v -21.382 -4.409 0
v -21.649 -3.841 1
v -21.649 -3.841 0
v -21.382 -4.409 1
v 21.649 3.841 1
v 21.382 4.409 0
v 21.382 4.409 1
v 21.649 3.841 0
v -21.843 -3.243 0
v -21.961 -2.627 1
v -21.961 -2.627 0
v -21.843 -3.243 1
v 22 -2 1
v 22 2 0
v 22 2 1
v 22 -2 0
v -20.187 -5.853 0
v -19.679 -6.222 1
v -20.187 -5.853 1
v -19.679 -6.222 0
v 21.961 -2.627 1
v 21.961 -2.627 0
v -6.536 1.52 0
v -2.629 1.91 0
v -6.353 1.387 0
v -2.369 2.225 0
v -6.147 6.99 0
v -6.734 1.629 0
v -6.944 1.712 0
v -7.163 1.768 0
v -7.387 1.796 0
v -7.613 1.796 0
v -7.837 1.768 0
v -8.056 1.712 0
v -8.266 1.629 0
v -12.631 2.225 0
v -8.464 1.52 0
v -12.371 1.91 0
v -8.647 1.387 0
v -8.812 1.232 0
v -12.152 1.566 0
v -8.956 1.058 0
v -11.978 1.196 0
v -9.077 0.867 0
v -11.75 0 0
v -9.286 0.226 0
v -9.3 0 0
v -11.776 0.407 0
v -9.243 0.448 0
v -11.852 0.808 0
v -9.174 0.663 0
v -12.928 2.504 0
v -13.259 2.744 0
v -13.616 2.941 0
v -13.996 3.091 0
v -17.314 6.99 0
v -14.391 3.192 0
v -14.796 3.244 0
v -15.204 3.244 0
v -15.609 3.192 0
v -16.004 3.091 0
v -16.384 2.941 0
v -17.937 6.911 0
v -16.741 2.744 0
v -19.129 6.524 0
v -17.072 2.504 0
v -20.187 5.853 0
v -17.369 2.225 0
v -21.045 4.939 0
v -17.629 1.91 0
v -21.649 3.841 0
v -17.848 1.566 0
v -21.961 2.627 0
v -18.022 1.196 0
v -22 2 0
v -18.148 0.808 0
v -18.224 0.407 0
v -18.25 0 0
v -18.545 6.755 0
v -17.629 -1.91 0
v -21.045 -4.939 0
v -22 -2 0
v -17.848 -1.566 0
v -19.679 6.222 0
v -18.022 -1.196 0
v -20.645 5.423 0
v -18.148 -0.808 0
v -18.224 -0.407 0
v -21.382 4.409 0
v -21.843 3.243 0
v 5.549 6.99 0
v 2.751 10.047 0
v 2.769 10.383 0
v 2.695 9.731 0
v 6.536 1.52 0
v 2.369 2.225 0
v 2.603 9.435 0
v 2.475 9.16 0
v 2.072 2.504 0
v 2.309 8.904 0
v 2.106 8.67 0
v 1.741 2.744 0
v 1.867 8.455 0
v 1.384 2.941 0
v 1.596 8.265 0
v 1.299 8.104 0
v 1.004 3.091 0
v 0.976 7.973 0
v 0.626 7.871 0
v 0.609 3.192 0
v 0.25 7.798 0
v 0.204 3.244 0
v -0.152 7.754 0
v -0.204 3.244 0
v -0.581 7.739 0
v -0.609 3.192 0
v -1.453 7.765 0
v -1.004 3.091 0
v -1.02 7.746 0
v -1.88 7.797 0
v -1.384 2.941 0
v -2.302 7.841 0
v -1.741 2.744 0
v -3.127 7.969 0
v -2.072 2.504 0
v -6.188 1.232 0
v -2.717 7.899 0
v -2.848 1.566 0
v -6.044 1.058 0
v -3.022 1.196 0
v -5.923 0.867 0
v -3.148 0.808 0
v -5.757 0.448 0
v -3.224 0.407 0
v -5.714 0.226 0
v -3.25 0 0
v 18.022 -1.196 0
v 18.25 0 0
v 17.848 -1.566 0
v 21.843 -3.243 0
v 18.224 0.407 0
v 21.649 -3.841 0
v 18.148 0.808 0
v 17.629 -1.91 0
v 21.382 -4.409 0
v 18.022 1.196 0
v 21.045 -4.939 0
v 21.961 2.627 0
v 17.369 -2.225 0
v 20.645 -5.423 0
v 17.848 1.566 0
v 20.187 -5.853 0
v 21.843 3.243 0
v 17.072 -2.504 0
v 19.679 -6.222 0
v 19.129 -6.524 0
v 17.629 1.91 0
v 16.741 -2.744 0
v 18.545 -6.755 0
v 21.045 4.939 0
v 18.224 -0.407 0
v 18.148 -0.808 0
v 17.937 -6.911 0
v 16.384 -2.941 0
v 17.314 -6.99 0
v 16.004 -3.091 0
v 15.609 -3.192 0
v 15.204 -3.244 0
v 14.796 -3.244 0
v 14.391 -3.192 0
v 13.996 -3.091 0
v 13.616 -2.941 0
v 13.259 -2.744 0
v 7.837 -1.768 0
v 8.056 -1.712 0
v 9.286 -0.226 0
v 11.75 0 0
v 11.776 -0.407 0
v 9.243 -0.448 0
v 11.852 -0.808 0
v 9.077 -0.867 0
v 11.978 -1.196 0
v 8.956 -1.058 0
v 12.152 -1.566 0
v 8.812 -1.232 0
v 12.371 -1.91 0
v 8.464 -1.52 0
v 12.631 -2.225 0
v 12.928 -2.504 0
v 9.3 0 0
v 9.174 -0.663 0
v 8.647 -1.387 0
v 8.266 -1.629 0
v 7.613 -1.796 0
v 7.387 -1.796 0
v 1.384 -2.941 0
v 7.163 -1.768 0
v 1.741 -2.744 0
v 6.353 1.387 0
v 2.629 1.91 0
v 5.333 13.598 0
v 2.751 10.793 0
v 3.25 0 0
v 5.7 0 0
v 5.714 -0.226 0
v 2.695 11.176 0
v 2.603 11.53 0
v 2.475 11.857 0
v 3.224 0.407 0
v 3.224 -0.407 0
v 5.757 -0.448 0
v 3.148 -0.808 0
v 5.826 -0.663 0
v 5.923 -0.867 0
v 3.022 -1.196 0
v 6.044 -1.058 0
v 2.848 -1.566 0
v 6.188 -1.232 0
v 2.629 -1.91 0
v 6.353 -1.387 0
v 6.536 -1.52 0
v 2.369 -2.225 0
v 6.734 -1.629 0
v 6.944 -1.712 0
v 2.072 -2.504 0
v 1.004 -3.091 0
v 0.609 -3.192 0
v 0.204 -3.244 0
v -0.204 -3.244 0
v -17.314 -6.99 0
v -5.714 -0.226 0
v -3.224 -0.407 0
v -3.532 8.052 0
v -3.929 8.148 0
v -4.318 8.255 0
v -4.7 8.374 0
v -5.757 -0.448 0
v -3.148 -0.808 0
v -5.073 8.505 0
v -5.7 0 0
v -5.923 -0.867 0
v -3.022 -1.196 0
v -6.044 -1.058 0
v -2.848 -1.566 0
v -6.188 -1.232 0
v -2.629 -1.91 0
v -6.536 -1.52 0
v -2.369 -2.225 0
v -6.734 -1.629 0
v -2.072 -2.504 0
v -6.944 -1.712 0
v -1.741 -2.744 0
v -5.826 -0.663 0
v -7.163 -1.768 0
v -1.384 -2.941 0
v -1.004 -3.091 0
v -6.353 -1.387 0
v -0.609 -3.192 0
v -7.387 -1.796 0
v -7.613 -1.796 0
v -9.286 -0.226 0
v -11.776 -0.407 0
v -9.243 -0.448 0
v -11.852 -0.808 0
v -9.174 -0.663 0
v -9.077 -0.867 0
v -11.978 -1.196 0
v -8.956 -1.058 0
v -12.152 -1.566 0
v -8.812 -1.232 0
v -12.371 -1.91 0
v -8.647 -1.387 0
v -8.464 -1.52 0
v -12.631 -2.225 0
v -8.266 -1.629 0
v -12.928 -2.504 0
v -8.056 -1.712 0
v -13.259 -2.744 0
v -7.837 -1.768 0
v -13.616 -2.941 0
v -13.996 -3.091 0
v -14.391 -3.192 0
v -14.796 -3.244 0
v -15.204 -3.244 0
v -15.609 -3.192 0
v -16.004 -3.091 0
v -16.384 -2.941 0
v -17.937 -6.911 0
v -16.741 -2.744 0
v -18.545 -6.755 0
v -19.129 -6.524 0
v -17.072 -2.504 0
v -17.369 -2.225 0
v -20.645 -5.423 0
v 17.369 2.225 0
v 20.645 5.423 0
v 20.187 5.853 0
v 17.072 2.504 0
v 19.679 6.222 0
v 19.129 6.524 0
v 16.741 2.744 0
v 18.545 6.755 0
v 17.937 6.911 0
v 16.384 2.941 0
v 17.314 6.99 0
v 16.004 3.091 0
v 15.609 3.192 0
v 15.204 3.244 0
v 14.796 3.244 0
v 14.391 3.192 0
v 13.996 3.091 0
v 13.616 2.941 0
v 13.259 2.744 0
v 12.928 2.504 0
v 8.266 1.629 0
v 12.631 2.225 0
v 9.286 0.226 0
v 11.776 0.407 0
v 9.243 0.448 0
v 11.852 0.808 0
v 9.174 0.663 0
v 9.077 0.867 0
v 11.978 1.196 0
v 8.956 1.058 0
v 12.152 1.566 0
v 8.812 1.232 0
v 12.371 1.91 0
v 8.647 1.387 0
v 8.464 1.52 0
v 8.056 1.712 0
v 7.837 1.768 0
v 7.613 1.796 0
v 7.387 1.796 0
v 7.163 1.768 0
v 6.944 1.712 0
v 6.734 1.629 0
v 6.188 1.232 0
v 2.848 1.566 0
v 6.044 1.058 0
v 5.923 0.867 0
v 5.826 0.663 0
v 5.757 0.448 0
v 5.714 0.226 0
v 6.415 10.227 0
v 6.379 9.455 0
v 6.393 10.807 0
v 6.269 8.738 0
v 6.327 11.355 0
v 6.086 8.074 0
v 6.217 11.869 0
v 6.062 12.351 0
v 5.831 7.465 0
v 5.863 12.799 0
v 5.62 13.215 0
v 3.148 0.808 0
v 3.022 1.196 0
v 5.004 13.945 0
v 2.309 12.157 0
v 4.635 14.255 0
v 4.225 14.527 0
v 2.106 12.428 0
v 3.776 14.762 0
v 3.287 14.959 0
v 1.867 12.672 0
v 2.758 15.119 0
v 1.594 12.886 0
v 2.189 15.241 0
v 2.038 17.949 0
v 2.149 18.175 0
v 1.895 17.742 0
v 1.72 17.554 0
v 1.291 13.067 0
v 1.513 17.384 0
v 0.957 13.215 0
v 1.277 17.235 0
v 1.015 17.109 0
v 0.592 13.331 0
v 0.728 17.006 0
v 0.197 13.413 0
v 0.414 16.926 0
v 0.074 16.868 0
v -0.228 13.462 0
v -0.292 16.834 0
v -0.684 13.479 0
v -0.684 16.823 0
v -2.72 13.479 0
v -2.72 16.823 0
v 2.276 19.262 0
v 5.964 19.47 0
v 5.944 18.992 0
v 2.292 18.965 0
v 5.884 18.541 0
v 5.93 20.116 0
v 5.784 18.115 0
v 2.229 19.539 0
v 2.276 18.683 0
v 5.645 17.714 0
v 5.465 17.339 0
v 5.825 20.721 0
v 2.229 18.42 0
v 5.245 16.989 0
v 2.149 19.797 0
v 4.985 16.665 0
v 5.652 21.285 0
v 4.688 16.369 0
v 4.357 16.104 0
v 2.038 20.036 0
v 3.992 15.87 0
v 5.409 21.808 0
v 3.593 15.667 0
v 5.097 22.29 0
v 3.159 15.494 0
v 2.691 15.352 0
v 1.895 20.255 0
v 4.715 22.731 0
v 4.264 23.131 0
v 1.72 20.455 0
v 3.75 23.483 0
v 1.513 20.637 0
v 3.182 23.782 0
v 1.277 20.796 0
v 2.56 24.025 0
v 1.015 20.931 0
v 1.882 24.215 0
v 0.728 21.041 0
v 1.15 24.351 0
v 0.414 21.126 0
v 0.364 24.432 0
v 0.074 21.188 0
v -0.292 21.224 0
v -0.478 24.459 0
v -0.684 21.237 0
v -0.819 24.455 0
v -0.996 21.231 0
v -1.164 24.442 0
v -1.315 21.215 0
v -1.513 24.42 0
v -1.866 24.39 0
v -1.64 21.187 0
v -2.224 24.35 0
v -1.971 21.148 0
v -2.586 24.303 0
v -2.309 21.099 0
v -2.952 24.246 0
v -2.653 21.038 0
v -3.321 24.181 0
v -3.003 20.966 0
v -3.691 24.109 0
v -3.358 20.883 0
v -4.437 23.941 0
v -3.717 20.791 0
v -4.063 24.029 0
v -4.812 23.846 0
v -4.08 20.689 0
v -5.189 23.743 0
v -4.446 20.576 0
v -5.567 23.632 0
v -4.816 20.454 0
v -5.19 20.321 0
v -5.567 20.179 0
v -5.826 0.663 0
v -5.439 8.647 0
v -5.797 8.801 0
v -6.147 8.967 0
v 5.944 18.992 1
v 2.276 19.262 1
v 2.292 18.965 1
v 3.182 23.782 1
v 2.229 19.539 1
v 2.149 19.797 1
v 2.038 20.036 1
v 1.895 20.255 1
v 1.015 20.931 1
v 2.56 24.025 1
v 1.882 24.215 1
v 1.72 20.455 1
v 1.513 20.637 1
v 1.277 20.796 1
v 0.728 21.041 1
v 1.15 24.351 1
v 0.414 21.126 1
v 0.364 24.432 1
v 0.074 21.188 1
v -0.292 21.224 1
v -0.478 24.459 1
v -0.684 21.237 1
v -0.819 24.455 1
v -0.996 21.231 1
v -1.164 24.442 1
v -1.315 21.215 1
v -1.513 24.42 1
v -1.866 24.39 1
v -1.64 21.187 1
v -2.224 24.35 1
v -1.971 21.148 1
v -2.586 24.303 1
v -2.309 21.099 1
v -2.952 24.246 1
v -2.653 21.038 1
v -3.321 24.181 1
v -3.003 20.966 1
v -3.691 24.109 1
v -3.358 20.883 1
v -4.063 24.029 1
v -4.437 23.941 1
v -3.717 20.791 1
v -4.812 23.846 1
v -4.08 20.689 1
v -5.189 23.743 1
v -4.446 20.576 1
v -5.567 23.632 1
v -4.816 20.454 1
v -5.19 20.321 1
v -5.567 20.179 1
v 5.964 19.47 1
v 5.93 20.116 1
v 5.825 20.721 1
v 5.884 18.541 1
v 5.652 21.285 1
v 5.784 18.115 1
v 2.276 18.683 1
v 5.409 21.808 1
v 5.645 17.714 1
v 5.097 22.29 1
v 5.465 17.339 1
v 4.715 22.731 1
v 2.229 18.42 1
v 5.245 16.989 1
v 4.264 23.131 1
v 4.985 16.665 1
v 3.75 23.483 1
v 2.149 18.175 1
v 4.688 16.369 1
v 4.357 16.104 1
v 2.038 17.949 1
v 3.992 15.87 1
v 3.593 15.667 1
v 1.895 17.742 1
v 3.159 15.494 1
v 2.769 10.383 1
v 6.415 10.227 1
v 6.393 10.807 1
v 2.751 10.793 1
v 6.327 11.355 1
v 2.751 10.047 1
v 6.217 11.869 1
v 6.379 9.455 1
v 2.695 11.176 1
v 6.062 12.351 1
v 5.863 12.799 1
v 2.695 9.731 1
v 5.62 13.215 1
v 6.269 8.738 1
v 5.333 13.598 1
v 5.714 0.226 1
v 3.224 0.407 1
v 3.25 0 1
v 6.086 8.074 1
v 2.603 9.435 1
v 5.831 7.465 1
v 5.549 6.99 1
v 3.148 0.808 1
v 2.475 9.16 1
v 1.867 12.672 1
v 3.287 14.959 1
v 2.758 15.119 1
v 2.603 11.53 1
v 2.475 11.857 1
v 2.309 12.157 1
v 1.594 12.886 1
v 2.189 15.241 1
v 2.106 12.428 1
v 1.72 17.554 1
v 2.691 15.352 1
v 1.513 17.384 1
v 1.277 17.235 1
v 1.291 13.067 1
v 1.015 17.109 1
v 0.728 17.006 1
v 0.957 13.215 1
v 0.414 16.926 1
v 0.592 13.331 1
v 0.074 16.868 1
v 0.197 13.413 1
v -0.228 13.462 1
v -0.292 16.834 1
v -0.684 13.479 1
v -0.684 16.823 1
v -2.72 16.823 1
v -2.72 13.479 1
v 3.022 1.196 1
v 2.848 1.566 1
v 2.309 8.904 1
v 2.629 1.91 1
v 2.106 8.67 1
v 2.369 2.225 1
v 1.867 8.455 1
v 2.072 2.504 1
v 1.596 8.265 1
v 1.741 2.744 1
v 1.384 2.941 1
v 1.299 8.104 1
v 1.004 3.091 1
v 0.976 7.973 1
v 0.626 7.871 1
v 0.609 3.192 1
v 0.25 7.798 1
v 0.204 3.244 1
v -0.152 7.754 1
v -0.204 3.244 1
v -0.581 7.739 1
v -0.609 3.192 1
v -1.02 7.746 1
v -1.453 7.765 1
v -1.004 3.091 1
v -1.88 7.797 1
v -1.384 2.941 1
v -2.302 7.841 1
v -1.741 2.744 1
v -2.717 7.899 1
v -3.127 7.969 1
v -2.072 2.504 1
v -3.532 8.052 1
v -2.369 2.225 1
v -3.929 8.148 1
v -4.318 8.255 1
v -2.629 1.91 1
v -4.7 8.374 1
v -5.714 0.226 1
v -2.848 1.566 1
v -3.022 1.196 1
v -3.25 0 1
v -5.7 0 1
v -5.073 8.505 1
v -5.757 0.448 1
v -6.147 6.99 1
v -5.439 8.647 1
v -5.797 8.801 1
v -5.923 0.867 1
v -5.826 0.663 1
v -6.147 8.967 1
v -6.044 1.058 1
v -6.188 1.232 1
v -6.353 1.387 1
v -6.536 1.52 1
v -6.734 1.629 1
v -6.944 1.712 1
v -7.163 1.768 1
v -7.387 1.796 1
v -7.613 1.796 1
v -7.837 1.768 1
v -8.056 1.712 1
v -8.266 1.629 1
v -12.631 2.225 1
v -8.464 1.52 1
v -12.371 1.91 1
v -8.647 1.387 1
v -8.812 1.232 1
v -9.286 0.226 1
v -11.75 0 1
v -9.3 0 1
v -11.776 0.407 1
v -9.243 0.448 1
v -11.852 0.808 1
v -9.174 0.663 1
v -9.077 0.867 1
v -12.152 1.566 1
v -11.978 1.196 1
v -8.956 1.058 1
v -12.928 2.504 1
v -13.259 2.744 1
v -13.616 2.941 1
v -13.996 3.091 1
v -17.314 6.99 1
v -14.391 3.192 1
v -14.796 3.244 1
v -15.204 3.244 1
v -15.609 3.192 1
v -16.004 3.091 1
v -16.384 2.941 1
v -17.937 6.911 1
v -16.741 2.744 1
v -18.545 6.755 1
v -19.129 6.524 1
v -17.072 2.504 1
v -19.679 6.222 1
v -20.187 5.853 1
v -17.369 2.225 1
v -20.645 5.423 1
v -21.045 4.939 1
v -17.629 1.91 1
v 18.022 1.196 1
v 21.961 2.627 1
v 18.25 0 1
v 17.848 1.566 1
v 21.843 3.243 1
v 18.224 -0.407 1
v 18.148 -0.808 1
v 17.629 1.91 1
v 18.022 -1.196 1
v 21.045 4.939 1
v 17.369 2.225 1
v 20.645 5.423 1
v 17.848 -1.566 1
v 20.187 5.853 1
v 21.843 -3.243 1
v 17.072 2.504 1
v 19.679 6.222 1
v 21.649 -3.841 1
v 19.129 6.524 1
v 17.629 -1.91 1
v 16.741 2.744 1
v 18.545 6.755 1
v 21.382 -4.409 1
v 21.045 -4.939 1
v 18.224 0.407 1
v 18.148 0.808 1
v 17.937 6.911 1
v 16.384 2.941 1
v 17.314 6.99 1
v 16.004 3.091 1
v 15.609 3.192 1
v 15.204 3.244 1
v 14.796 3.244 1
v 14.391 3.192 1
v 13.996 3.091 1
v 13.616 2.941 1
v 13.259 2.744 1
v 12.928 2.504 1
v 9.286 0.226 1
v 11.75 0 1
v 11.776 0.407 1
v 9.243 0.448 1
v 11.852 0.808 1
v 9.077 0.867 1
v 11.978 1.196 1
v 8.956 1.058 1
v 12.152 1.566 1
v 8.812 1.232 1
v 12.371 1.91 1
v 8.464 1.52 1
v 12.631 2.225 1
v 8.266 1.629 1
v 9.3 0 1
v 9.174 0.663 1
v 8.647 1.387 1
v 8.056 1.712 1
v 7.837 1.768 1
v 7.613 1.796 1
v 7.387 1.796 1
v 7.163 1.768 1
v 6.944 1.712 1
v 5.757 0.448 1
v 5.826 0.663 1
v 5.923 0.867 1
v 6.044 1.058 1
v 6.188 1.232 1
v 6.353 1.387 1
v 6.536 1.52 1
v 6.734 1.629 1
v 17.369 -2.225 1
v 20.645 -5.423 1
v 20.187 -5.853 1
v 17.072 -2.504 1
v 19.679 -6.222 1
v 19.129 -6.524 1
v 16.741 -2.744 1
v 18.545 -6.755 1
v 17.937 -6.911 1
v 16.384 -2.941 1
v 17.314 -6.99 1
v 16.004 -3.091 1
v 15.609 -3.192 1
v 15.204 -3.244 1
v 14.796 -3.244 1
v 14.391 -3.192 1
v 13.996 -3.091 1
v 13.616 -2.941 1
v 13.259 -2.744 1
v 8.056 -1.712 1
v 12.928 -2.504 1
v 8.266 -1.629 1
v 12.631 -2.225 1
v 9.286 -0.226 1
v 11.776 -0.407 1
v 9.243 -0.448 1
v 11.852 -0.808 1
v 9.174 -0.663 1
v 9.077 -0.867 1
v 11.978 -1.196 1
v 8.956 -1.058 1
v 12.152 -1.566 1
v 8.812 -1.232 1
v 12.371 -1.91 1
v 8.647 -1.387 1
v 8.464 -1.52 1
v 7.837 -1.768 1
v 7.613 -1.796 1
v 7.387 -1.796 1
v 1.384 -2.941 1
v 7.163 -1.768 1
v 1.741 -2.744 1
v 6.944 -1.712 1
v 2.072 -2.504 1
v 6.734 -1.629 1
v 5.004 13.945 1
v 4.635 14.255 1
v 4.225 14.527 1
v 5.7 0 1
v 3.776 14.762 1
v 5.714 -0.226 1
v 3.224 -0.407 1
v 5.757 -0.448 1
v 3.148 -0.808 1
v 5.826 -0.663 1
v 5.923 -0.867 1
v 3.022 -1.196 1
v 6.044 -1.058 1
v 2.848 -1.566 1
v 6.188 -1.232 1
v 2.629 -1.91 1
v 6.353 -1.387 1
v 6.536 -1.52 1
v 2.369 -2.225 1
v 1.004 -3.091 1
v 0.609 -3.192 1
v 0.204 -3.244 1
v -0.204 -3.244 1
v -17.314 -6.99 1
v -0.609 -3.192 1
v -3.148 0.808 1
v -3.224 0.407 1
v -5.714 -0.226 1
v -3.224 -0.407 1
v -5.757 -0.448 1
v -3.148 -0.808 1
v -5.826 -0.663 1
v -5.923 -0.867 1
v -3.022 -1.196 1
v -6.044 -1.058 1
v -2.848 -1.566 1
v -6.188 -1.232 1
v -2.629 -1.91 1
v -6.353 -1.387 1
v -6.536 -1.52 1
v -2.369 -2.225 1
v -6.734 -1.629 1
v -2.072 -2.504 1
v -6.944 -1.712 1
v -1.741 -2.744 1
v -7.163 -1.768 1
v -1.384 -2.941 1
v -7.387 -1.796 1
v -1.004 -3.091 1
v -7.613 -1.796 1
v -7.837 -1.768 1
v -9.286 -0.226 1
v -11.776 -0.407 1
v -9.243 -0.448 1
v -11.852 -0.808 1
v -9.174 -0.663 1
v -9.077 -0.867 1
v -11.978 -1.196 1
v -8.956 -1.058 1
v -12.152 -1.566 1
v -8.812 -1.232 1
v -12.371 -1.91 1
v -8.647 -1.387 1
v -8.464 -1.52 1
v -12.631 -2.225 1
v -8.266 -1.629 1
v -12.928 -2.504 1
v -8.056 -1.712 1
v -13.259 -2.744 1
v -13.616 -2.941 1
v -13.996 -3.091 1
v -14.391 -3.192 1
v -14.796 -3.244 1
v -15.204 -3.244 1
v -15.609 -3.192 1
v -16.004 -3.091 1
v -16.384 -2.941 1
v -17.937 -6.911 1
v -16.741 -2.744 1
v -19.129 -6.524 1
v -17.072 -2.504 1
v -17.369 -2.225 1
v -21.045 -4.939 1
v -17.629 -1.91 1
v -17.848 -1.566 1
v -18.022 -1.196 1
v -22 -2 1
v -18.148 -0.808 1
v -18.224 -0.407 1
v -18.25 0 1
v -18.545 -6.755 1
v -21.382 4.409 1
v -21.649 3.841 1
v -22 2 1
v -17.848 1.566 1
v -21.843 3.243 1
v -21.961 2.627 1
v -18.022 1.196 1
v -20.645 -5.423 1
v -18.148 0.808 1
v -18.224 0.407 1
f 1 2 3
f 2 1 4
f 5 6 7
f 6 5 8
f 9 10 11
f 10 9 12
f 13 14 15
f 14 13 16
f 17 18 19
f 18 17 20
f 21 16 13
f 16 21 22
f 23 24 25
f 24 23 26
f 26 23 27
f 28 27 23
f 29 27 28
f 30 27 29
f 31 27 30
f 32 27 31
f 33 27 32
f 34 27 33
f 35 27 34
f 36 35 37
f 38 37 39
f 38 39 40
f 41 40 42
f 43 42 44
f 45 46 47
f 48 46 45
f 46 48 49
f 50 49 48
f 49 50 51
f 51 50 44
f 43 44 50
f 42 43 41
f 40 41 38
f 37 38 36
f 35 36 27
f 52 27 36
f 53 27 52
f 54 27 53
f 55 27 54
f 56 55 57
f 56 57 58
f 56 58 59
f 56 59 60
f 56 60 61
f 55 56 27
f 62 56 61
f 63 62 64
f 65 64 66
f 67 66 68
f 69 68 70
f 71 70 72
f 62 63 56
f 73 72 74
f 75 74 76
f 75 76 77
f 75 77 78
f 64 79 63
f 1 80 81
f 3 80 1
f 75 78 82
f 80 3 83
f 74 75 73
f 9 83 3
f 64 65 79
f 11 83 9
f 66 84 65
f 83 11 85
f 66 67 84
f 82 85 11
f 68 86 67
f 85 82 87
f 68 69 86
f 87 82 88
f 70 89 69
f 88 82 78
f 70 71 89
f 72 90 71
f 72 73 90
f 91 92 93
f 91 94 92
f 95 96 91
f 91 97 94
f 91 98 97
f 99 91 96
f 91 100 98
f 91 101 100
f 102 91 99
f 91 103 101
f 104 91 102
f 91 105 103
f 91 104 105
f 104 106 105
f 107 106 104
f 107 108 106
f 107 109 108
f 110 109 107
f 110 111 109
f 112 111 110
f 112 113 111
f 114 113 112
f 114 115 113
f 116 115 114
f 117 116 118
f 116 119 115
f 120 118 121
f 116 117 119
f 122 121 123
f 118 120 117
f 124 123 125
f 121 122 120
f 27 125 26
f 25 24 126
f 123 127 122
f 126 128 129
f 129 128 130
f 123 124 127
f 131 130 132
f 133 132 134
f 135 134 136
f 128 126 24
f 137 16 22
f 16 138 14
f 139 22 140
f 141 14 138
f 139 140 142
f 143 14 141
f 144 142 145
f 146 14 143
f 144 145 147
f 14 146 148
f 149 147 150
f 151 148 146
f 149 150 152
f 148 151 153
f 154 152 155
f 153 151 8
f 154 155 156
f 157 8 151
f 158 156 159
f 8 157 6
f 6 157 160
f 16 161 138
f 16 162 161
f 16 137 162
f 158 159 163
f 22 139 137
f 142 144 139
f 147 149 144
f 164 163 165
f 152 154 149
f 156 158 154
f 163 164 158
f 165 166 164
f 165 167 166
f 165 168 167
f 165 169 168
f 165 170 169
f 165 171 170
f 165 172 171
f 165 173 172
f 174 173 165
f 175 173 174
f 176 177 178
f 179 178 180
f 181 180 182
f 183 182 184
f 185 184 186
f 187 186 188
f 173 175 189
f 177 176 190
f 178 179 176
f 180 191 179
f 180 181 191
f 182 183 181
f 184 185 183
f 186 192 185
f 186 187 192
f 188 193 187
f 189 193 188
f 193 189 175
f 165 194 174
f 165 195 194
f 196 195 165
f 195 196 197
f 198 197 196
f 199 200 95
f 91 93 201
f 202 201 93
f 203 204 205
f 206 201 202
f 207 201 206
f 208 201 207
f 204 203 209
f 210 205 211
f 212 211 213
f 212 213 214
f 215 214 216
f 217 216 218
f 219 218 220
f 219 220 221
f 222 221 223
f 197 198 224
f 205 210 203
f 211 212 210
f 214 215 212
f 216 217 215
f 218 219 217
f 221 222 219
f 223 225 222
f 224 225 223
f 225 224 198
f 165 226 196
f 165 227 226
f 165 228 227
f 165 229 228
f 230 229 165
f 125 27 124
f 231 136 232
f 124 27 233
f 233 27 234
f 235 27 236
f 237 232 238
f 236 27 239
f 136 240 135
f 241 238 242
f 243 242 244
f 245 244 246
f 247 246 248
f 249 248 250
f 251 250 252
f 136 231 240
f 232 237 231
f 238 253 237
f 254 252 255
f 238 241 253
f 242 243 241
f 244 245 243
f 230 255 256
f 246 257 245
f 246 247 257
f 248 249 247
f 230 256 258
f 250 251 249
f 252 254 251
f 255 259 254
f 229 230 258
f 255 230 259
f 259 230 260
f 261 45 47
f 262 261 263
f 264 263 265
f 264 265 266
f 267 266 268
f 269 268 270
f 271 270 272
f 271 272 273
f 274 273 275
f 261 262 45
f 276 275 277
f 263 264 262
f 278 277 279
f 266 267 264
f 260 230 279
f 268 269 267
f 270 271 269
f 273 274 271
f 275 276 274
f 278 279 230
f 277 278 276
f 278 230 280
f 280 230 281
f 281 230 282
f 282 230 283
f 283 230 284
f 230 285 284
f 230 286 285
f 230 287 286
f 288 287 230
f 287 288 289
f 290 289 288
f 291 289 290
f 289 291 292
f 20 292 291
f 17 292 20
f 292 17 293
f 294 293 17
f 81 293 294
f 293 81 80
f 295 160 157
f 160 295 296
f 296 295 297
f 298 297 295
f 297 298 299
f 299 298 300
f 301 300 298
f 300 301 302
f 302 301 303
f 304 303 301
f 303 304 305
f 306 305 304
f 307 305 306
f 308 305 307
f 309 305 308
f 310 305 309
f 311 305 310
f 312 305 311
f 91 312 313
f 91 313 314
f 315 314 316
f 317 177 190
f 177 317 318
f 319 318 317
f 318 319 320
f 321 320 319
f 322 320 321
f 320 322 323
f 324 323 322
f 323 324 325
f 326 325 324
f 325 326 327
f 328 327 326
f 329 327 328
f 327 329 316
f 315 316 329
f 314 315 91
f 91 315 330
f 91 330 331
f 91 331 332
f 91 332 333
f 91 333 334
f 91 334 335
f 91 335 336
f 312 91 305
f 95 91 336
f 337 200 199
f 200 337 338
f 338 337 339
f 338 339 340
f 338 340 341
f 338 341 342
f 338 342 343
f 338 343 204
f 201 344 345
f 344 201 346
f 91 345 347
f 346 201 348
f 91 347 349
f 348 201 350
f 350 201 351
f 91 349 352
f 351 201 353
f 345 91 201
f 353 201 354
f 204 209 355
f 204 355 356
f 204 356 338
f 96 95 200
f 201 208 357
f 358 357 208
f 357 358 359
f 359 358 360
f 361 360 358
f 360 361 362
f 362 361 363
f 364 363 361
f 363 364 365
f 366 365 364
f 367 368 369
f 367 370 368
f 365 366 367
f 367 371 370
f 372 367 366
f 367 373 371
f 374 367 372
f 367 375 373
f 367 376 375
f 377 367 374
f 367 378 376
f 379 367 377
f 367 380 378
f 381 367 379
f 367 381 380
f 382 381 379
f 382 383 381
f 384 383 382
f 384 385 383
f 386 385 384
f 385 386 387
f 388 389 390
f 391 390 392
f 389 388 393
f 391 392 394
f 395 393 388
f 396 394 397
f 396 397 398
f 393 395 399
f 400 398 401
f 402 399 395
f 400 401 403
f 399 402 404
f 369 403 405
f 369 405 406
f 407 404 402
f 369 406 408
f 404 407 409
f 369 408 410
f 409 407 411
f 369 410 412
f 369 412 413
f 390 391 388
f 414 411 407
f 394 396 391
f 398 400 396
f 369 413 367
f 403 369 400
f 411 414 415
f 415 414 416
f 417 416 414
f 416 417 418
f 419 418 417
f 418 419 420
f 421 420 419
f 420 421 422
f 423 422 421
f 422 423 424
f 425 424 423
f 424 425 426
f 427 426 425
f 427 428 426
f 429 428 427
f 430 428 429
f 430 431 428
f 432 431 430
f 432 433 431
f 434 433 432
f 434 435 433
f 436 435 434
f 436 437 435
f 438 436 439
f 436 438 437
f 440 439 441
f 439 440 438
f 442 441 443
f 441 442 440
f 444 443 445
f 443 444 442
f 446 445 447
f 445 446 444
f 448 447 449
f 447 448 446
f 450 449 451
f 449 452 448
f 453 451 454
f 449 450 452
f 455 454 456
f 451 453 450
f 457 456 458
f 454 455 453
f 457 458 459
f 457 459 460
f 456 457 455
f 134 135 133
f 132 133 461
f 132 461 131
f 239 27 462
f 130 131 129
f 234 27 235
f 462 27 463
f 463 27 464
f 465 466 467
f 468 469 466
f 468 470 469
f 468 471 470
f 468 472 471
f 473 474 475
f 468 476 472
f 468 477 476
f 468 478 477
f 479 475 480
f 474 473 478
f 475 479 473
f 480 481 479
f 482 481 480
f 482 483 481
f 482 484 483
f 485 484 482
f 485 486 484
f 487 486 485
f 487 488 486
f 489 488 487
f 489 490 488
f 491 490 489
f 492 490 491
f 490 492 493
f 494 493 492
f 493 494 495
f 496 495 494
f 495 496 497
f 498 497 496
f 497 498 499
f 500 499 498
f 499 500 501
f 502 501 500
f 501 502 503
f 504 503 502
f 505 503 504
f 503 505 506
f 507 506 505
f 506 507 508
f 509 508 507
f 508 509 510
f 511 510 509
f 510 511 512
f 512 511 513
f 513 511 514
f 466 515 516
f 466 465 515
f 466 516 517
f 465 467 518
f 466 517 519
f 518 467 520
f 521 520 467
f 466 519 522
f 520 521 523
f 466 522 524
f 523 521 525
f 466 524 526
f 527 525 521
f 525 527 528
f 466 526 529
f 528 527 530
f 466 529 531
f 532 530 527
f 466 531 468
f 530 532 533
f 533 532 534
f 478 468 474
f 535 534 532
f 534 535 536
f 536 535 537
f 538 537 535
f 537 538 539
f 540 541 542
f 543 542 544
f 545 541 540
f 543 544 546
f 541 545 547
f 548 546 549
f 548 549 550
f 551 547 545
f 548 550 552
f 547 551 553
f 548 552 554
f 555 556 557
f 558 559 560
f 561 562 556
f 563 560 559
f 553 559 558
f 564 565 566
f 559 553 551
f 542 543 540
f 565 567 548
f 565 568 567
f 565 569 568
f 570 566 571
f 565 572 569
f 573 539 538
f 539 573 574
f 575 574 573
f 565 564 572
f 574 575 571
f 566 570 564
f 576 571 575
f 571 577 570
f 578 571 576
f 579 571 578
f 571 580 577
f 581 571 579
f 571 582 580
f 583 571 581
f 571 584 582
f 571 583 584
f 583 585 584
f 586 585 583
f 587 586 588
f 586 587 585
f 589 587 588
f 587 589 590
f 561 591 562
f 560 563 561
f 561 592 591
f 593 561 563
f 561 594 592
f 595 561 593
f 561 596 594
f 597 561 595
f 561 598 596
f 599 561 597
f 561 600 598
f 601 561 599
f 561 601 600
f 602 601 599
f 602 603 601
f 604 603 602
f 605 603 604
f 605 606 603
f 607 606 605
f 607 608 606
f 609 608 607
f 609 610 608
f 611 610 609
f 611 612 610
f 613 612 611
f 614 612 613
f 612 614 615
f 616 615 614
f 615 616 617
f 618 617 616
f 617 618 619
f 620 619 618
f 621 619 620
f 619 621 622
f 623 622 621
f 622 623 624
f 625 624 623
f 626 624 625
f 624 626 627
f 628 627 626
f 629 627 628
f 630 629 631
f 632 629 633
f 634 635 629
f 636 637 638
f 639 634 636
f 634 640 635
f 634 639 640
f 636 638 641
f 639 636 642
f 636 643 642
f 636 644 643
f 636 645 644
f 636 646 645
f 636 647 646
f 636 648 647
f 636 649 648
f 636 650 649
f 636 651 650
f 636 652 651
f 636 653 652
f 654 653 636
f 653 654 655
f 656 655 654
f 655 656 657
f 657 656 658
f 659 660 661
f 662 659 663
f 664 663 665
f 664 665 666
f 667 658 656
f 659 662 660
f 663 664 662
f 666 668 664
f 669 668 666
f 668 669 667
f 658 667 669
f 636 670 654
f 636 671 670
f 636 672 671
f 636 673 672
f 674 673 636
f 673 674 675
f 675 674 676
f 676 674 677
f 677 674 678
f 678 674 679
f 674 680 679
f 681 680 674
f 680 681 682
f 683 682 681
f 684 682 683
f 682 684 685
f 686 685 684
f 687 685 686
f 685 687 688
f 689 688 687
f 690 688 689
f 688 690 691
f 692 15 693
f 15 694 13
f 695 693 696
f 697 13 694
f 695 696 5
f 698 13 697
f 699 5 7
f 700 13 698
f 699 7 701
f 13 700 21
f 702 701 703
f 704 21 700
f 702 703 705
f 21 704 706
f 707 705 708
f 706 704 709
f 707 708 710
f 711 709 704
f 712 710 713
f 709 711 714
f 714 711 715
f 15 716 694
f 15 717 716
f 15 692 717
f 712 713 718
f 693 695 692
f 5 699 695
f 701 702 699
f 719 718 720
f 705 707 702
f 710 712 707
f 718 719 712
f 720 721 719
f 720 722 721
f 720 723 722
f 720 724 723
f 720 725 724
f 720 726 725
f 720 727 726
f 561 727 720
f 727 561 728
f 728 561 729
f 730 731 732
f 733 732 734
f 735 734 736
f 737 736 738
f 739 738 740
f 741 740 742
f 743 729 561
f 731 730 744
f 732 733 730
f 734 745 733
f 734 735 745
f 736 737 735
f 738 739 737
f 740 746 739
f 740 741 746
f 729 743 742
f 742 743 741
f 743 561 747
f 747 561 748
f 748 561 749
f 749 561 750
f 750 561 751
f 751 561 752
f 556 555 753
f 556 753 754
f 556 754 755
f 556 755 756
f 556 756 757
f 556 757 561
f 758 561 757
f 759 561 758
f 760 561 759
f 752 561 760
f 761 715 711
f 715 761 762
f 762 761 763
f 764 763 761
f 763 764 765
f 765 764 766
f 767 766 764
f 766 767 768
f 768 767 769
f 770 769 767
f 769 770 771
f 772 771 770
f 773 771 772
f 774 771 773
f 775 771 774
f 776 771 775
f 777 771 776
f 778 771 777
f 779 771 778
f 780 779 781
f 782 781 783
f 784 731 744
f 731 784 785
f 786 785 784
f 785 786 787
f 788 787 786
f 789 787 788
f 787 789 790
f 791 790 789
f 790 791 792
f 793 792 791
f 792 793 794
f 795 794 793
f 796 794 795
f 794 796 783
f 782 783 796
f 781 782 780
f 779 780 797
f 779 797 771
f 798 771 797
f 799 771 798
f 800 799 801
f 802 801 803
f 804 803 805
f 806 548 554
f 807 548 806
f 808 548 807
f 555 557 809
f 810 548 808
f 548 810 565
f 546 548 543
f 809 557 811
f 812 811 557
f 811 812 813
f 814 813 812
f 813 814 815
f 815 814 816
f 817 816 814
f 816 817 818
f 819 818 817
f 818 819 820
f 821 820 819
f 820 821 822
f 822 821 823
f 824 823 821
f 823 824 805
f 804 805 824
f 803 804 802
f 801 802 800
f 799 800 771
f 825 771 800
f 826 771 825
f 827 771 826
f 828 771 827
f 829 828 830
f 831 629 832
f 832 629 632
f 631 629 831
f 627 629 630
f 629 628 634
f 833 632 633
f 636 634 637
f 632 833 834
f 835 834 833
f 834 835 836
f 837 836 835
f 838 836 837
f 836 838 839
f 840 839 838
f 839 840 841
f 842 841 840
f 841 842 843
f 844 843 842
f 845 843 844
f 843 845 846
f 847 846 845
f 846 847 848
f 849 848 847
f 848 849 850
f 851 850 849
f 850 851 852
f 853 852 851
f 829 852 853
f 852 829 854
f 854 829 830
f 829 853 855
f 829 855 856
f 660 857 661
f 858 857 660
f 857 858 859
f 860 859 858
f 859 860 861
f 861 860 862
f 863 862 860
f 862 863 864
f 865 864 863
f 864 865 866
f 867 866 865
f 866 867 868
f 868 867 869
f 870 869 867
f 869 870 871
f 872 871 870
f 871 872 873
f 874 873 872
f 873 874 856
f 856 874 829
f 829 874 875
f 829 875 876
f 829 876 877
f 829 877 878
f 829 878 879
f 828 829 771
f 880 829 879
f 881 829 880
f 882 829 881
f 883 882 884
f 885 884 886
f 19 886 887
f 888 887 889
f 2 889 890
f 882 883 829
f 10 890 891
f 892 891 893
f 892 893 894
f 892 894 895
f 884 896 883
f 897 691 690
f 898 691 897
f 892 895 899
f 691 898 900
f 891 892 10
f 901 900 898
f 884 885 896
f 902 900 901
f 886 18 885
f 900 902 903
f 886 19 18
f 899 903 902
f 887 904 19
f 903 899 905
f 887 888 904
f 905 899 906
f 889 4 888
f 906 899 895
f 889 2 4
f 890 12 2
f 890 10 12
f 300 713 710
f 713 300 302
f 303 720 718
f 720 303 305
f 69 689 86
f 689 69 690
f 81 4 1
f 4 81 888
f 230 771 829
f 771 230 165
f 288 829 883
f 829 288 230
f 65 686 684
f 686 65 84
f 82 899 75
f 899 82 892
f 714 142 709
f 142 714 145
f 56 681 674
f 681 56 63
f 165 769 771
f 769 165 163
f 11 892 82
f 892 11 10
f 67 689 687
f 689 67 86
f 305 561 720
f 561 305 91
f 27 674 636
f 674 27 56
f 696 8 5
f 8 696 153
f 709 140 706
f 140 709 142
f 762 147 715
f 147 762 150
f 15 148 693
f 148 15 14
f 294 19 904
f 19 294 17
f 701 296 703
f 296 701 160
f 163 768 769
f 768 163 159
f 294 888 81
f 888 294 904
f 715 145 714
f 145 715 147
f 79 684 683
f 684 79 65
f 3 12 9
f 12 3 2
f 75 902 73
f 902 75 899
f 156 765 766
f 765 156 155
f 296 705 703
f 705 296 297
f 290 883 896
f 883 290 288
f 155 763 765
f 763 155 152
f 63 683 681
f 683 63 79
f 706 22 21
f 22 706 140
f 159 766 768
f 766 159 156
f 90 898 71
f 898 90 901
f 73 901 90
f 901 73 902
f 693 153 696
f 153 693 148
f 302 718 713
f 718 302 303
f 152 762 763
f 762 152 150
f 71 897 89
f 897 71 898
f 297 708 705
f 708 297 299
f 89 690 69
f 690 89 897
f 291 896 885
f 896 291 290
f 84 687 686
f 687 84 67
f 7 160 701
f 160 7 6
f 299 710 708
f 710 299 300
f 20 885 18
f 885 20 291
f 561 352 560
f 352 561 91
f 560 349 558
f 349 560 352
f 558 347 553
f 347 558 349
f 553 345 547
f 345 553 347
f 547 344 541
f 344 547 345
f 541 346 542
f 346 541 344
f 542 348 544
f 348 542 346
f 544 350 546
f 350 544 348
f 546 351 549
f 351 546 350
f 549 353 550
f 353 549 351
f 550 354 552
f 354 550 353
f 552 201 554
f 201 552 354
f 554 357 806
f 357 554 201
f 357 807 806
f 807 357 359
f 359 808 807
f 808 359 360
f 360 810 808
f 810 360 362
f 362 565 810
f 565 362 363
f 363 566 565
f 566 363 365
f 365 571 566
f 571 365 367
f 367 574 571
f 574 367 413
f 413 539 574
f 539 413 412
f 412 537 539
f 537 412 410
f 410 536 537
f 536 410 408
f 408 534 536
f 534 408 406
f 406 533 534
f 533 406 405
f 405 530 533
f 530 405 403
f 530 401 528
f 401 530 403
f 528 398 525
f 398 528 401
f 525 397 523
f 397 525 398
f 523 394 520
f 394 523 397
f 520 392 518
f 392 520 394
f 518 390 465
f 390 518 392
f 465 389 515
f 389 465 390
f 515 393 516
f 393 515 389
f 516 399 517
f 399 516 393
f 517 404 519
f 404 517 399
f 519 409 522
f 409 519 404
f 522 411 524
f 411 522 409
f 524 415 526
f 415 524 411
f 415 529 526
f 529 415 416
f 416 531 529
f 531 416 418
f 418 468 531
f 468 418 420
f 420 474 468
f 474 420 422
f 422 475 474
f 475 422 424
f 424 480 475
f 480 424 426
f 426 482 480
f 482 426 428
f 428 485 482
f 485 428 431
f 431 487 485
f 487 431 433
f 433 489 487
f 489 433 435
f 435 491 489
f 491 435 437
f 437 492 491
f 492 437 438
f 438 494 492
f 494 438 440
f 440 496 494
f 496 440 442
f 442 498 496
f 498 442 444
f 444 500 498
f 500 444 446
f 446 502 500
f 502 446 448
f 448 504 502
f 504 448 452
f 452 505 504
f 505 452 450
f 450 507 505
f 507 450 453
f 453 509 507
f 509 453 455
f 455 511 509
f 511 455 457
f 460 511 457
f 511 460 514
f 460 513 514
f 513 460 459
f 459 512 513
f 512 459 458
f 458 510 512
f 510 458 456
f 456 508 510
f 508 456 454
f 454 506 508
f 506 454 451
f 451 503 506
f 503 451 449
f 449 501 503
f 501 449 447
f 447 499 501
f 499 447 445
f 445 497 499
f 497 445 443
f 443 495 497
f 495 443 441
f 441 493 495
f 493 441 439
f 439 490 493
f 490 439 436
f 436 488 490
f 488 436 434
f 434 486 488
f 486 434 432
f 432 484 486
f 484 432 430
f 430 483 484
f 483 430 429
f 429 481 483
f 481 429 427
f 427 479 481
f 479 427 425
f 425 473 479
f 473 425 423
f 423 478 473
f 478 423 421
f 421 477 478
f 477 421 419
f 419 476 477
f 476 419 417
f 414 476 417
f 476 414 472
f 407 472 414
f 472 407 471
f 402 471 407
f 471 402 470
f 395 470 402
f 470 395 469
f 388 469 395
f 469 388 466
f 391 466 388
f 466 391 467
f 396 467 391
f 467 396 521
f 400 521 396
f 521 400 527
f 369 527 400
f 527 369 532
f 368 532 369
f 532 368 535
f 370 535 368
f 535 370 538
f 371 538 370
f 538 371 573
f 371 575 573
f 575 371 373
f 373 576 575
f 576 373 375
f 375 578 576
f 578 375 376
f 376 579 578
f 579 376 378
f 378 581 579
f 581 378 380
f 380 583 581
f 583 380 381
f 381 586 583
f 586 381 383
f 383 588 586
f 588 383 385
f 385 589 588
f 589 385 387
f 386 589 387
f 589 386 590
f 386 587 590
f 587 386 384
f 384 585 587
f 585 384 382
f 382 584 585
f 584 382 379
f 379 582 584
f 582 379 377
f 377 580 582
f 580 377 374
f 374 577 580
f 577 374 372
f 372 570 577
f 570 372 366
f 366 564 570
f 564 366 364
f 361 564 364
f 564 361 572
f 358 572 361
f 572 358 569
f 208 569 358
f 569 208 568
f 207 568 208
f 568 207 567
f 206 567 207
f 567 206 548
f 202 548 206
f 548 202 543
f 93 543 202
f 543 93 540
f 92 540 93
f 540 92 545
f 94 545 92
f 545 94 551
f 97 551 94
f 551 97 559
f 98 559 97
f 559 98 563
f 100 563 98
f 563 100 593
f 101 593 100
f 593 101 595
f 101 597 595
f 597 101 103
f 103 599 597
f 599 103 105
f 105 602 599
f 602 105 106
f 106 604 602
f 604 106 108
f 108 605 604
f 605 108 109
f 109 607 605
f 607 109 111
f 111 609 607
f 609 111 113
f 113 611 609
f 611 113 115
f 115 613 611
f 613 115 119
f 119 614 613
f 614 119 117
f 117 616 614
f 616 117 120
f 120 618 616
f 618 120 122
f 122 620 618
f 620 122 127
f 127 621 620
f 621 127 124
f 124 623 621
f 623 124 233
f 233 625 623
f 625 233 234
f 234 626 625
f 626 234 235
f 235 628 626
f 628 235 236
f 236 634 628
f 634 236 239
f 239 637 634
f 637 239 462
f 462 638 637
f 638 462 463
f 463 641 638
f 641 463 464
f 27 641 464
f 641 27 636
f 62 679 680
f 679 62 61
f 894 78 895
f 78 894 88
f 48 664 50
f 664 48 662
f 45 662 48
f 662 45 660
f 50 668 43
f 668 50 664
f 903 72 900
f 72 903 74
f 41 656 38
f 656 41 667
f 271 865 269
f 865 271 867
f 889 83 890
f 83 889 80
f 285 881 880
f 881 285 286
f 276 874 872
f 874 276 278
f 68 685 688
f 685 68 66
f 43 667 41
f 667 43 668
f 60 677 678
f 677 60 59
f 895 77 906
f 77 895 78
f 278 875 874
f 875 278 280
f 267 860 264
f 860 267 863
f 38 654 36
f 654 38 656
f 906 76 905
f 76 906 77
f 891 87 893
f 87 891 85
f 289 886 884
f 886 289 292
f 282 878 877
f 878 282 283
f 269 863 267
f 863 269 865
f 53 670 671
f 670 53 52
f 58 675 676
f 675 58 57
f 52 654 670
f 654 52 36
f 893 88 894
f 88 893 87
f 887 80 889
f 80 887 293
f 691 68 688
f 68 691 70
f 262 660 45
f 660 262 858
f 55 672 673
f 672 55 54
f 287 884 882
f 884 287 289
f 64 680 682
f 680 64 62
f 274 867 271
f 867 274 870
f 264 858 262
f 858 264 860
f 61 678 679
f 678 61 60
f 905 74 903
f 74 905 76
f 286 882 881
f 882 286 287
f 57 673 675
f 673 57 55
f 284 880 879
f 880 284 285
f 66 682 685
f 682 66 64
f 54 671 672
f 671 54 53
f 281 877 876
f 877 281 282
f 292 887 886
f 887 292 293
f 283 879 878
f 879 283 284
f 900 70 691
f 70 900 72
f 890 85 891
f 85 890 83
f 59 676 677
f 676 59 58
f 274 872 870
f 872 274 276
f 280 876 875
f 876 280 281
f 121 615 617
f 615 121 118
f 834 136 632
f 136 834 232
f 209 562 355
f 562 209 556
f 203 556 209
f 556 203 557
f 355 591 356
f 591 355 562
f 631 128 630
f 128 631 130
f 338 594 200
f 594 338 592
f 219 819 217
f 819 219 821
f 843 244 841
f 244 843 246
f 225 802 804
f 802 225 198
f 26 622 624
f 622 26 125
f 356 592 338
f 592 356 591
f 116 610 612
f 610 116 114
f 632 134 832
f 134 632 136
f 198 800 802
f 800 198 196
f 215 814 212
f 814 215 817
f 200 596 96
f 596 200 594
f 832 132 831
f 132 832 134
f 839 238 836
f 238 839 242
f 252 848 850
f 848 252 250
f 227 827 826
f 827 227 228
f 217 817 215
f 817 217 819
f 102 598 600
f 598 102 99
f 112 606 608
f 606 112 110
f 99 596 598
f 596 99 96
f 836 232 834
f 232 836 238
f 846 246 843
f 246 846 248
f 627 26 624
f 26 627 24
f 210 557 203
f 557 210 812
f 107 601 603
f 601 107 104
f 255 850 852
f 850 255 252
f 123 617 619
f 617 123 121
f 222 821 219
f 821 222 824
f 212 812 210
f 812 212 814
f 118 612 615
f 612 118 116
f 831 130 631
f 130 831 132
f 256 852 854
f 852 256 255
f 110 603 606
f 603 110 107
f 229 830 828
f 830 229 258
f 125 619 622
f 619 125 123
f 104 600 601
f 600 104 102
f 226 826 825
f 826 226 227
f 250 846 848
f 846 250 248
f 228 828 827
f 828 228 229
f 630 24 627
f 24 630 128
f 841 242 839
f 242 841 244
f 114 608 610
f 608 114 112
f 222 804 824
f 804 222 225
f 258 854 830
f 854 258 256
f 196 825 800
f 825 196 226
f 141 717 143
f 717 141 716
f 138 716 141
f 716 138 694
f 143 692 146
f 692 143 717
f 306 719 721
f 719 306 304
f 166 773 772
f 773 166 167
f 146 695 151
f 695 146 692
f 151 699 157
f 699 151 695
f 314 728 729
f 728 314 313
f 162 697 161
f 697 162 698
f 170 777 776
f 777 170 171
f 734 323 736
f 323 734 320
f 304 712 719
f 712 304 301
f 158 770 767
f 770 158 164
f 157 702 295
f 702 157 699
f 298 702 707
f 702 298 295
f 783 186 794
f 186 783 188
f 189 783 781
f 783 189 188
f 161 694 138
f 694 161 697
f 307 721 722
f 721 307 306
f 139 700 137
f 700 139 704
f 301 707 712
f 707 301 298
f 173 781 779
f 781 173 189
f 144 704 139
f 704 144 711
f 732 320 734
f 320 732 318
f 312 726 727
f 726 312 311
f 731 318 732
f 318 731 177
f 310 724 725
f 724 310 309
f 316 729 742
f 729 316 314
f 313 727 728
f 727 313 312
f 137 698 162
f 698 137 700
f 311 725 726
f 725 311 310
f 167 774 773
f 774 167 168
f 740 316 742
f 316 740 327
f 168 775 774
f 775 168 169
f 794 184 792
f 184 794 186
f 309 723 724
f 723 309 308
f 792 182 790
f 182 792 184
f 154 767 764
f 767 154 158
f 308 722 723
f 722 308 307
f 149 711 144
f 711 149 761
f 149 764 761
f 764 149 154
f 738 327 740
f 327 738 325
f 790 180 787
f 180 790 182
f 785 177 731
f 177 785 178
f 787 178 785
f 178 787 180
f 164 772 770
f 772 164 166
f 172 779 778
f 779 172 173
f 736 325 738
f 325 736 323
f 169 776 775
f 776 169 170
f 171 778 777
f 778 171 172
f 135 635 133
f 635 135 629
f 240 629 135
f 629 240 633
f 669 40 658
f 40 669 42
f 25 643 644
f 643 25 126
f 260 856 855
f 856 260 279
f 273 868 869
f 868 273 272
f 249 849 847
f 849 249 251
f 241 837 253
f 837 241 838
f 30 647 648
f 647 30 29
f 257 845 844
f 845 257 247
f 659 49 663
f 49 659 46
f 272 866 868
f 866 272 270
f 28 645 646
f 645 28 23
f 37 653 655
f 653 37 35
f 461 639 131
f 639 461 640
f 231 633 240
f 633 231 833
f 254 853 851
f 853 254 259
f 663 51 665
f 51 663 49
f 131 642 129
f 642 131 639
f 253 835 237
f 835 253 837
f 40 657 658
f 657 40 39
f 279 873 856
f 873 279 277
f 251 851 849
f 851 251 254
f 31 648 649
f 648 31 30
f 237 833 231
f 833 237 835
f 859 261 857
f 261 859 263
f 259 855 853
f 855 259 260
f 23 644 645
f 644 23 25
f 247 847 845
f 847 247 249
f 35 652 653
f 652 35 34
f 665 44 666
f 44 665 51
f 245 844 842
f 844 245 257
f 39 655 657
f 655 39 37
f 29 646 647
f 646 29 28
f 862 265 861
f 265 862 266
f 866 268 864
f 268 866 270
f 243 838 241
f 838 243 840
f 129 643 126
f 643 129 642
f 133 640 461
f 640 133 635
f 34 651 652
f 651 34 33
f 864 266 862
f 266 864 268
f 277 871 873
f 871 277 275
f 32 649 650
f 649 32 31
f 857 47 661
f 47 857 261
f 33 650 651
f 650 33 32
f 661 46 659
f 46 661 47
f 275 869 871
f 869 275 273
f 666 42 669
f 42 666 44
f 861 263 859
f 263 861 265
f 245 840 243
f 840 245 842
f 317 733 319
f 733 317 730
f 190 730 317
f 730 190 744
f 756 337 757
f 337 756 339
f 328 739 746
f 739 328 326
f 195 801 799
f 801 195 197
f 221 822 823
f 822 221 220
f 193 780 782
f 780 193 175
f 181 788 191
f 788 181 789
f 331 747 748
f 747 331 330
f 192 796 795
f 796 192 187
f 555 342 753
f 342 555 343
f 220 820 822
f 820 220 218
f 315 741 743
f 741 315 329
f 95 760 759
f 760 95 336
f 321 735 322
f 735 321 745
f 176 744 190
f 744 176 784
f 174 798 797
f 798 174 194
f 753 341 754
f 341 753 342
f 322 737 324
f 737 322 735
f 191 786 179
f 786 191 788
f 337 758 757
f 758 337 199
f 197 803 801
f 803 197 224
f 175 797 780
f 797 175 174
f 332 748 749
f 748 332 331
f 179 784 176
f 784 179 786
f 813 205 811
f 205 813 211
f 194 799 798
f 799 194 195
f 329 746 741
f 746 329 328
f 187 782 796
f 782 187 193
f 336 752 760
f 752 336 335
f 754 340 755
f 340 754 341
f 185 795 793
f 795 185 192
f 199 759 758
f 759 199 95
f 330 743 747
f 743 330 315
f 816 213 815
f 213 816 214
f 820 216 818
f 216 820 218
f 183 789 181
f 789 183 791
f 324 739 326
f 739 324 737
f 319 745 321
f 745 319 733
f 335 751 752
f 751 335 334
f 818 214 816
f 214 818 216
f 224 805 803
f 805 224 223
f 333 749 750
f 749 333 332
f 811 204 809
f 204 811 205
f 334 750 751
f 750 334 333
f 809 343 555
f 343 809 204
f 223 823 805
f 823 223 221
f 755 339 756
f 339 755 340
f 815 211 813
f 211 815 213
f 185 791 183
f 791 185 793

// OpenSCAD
$fn = 50;


difference() {
	union() {
		hull() {
			translate(v = [-17.0000000000, 2.0000000000, 0]) {
				cylinder(h = 1, r = 5);
			}
			translate(v = [17.0000000000, 2.0000000000, 0]) {
				cylinder(h = 1, r = 5);
			}
			translate(v = [-17.0000000000, -2.0000000000, 0]) {
				cylinder(h = 1, r = 5);
			}
			translate(v = [17.0000000000, -2.0000000000, 0]) {
				cylinder(h = 1, r = 5);
			}
		}
		translate(v = [0, 24, 0]) {
			linear_extrude(height = 1) {
				text(font = "DejaVu Sans Mono:style=Bold", halign = "center", size = 19.0000000000, text = "3", valign = "top");
			}
		}
	}
	union() {
		translate(v = [-15.0000000000, 0.0000000000, 0]) {
			translate(v = [0, 0, -100]) {
				cylinder(h = 200, r = 3.2500000000);
			}
		}
		translate(v = [0, 0, -100]) {
			cylinder(h = 200, r = 3.2500000000);
		}
		translate(v = [15.0000000000, 0.0000000000, 0]) {
			translate(v = [0, 0, -100]) {
				cylinder(h = 200, r = 3.2500000000);
			}
		}
		translate(v = [-15.0000000000, 0.0000000000, 0]) {
			translate(v = [0, 0, -100]) {
				cylinder(h = 200, r = 1.8000000000);
			}
		}
		translate(v = [-7.5000000000, 0.0000000000, 0]) {
			translate(v = [0, 0, -100]) {
				cylinder(h = 200, r = 1.8000000000);
			}
		}
		translate(v = [0, 0, -100]) {
			cylinder(h = 200, r = 1.8000000000);
		}
		translate(v = [7.5000000000, 0.0000000000, 0]) {
			translate(v = [0, 0, -100]) {
				cylinder(h = 200, r = 1.8000000000);
			}
		}
		translate(v = [15.0000000000, 0.0000000000, 0]) {
			translate(v = [0, 0, -100]) {
				cylinder(h = 200, r = 1.8000000000);
			}
		}
	}
}
